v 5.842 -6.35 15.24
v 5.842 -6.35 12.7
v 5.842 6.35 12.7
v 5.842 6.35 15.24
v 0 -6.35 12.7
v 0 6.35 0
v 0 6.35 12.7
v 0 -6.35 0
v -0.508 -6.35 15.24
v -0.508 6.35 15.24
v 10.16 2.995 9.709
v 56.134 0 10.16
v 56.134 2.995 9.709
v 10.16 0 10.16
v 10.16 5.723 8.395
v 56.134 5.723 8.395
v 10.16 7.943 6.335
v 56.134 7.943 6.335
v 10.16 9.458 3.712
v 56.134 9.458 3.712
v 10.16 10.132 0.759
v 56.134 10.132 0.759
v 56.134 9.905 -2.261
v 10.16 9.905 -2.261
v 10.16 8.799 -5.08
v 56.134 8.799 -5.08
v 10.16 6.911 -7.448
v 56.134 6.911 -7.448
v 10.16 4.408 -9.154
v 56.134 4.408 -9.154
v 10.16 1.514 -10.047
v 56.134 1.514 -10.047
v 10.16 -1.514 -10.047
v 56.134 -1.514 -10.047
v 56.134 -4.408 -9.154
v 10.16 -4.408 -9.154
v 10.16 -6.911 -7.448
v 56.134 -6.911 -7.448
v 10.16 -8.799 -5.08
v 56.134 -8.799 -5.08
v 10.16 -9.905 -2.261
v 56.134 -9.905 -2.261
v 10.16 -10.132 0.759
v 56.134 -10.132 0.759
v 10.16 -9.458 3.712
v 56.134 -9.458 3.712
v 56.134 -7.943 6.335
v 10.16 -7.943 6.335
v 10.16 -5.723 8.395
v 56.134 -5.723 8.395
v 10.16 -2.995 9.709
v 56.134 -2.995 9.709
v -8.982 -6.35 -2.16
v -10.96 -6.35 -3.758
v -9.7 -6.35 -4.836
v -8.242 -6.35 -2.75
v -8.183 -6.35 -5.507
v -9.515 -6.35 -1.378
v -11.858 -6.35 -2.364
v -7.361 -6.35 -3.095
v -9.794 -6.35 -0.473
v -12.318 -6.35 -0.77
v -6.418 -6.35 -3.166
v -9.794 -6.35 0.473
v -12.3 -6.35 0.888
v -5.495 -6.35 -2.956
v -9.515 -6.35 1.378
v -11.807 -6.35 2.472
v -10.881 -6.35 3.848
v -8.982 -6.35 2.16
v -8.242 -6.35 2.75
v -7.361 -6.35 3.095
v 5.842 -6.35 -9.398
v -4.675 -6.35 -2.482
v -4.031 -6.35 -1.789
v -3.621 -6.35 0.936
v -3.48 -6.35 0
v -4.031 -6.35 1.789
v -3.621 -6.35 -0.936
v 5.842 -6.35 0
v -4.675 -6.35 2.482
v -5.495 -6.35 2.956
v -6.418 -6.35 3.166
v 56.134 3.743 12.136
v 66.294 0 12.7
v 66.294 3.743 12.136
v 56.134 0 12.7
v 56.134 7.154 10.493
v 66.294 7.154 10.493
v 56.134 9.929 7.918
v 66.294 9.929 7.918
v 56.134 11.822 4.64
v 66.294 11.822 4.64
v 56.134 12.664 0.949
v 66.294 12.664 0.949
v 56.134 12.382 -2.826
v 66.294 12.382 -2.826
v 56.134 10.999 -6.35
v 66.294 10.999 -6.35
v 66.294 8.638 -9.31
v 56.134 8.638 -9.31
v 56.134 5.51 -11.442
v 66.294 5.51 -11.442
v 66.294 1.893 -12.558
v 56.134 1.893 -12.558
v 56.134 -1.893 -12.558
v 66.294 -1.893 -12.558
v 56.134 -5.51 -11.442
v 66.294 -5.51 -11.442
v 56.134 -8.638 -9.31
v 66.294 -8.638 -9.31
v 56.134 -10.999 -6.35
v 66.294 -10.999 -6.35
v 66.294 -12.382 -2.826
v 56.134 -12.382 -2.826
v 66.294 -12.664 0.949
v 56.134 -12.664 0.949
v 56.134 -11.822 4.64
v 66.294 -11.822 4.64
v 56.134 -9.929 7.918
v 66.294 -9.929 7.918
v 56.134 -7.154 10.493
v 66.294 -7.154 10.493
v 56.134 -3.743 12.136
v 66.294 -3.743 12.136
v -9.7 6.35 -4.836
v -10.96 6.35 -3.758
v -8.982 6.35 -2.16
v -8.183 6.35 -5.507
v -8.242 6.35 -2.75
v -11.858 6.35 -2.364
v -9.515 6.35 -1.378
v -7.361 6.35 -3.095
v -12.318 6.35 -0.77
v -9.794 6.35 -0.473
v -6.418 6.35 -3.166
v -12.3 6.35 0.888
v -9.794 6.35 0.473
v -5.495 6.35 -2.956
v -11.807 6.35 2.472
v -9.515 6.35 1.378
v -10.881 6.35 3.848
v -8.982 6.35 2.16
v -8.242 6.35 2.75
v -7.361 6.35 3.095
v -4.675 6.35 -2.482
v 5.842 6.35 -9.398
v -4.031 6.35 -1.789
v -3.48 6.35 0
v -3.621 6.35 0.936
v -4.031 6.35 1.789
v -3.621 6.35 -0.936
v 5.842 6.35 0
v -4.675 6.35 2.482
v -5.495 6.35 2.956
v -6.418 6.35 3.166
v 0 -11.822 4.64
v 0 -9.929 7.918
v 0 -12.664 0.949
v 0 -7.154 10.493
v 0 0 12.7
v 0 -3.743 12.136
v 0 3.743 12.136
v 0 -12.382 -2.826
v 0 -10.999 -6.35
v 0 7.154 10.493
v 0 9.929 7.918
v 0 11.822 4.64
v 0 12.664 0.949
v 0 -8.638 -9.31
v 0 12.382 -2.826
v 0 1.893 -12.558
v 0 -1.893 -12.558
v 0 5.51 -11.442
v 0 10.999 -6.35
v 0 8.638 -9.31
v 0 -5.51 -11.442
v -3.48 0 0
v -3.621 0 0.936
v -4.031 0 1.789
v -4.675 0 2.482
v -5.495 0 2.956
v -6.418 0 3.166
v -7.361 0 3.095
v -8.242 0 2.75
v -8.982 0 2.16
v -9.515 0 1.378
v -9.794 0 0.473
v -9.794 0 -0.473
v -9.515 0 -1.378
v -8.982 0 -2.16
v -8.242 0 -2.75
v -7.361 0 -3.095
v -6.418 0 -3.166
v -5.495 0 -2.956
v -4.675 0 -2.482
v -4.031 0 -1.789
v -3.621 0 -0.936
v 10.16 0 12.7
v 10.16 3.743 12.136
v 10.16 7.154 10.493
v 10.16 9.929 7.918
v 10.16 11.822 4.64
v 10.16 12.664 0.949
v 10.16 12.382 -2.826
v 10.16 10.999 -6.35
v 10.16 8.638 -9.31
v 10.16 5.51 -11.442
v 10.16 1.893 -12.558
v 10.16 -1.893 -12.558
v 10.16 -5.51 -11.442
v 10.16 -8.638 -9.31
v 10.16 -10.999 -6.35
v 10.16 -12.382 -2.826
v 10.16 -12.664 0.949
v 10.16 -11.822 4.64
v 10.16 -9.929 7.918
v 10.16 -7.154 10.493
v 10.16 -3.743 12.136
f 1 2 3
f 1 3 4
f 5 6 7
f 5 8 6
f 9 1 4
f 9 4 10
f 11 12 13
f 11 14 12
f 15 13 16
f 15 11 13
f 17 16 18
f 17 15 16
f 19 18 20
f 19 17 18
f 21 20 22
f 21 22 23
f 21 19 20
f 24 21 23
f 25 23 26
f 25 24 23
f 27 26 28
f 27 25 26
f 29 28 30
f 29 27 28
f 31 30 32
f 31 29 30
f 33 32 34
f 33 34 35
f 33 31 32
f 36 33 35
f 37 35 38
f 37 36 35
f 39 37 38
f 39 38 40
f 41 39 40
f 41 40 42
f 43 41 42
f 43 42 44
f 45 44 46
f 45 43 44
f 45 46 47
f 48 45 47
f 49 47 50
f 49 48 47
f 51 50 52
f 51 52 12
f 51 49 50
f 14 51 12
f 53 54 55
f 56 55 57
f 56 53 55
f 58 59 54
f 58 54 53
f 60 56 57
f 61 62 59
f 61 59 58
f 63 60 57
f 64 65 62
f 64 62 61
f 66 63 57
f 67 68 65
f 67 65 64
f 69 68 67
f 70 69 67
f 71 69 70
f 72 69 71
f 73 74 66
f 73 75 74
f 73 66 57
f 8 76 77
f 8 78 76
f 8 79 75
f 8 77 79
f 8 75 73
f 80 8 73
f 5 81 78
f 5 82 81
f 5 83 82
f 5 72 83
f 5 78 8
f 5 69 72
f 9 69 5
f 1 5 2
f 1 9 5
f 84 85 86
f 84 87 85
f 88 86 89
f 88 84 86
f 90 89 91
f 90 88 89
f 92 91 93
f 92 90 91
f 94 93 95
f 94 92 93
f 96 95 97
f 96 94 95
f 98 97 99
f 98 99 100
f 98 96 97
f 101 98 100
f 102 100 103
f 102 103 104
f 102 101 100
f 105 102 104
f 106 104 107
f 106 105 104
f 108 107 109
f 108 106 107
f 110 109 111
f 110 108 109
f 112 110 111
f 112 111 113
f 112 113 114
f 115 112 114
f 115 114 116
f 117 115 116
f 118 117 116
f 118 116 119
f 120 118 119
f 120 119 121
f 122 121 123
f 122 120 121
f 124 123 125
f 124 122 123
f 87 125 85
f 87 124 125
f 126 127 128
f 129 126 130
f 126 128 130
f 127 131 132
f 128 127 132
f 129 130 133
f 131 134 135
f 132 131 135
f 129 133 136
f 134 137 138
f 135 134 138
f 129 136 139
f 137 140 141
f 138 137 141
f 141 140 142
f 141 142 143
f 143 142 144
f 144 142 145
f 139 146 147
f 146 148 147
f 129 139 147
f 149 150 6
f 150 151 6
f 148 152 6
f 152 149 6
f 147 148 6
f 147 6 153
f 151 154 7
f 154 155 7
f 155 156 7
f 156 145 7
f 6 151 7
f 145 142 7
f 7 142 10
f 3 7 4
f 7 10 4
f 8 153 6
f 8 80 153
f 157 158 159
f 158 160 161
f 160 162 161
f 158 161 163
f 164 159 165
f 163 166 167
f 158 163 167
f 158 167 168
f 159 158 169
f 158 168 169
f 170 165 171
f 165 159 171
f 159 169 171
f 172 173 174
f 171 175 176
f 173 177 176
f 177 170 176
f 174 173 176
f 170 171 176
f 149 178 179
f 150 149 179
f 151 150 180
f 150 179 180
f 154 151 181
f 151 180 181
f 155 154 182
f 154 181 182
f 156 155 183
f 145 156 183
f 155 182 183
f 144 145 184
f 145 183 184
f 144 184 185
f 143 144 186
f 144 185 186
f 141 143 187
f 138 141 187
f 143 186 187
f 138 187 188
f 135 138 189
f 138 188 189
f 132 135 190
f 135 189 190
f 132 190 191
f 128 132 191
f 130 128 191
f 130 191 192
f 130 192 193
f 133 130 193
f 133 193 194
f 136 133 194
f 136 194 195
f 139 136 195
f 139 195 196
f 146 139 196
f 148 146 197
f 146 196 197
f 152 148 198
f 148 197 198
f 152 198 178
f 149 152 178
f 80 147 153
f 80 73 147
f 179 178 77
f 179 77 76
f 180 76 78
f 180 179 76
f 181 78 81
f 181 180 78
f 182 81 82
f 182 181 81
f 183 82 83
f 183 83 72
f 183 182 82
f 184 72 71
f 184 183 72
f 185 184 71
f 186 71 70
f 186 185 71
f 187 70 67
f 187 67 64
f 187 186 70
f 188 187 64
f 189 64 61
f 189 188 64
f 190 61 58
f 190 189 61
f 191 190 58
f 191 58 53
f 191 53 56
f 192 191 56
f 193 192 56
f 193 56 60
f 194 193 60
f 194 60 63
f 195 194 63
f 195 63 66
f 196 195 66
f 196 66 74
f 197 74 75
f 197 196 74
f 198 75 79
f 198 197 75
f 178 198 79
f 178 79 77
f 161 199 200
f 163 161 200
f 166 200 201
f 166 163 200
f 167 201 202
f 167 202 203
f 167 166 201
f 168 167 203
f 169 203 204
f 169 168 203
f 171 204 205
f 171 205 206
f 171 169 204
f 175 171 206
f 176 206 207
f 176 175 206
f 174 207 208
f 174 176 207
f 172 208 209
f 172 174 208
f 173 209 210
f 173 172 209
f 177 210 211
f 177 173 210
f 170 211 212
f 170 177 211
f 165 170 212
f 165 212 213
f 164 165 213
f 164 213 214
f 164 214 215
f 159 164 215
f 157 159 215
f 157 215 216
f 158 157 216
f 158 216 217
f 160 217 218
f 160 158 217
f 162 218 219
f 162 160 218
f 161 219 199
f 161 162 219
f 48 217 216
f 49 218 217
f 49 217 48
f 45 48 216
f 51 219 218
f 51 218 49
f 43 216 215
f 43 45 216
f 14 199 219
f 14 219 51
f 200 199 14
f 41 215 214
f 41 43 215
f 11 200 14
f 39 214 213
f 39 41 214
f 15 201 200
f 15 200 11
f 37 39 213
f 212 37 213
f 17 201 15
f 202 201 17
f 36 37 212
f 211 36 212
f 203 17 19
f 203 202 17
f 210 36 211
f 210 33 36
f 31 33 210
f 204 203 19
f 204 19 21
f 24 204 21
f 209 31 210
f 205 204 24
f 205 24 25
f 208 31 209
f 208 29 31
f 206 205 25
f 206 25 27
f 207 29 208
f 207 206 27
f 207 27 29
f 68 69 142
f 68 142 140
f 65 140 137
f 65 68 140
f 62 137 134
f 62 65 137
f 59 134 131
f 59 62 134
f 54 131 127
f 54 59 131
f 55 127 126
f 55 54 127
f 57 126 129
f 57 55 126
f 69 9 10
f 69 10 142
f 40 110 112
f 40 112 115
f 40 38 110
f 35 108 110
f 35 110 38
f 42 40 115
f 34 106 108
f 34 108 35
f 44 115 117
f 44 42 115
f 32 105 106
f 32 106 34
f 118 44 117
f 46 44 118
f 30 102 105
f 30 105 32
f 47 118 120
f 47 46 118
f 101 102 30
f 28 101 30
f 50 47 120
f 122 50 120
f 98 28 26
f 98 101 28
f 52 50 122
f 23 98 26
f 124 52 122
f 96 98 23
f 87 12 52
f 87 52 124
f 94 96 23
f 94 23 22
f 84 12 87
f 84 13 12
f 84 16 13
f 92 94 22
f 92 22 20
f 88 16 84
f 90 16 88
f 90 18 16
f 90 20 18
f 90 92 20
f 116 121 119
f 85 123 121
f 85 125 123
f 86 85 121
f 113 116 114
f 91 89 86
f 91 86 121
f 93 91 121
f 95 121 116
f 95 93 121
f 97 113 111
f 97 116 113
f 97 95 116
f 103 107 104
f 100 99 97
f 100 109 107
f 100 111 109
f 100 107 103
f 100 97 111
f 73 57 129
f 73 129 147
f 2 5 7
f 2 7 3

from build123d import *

# Parameters (mm, degrees)
F0_W          = 5.842
F0_H          = 12.7
F0_R          = 3.175
F2_DEPTH      = 6.35
F2_DEPTH_BACK = 6.35


with BuildPart() as f1:
    # F0 (on Front) → F1 (revolve)
    with BuildSketch(Plane.XZ):
        Polygon((5.842, 12.7), (5.842, 0), (66.294, 0), (66.294, 12.7), (56.134, 12.7), (56.134, 10.16), (10.16, 10.16), (10.16, 12.7), align=None)
        with Locations((2.921, 6.35)):
            Rectangle(F0_W, F0_H)
    revolve(axis=Axis((33.147, 0, 0), (-1, 0, 0)))


with BuildPart() as f2:
    # F0 (on Front) → F2 (new body, two sides)
    with BuildSketch(Plane.XZ) as f2_sk:
        with BuildLine():
            Line((-0.9398, 0), (0, 0))
            Line((0, 0), (0, 12.7))
            Line((0, 12.7), (5.842, 12.7))
            Line((5.842, 12.7), (5.842, 15.24))
            Line((5.842, 15.24), (-0.508, 15.24))
            Line((-0.508, 15.24), (-10.88063, 3.847543))
            ThreePointArc((-10.88063, 3.847543), (-4.591961, 5.329721), (-0.9398, 0))
        make_face()
        with BuildLine():
            ThreePointArc((-8.182663, -5.506983), (-3.195791, -4.549339), (-0.9398, 0))
            ThreePointArc((-0.9398, 0), (-4.591961, 5.329721), (-10.88063, 3.847543))
            ThreePointArc((-10.88063, 3.847543), (-12.145978, -1.583727), (-8.182663, -5.506983))
        make_face()
        with Locations((-6.6548, 0)):
            Circle(F0_R, mode=Mode.SUBTRACT)
        with BuildLine():
            Line((5.842, 0), (0, 0))
            Line((0, 0), (-0.9398, 0))
            ThreePointArc((-0.9398, 0), (-3.195791, -4.549339), (-8.182663, -5.506983))
            Line((-8.182663, -5.506983), (5.842, -9.398))
            Line((5.842, -9.398), (5.842, 0))
        make_face()
    extrude(amount=F2_DEPTH)
    extrude(f2_sk.sketch, amount=-F2_DEPTH_BACK)


solid = Compound([f1.part, f2.part])
